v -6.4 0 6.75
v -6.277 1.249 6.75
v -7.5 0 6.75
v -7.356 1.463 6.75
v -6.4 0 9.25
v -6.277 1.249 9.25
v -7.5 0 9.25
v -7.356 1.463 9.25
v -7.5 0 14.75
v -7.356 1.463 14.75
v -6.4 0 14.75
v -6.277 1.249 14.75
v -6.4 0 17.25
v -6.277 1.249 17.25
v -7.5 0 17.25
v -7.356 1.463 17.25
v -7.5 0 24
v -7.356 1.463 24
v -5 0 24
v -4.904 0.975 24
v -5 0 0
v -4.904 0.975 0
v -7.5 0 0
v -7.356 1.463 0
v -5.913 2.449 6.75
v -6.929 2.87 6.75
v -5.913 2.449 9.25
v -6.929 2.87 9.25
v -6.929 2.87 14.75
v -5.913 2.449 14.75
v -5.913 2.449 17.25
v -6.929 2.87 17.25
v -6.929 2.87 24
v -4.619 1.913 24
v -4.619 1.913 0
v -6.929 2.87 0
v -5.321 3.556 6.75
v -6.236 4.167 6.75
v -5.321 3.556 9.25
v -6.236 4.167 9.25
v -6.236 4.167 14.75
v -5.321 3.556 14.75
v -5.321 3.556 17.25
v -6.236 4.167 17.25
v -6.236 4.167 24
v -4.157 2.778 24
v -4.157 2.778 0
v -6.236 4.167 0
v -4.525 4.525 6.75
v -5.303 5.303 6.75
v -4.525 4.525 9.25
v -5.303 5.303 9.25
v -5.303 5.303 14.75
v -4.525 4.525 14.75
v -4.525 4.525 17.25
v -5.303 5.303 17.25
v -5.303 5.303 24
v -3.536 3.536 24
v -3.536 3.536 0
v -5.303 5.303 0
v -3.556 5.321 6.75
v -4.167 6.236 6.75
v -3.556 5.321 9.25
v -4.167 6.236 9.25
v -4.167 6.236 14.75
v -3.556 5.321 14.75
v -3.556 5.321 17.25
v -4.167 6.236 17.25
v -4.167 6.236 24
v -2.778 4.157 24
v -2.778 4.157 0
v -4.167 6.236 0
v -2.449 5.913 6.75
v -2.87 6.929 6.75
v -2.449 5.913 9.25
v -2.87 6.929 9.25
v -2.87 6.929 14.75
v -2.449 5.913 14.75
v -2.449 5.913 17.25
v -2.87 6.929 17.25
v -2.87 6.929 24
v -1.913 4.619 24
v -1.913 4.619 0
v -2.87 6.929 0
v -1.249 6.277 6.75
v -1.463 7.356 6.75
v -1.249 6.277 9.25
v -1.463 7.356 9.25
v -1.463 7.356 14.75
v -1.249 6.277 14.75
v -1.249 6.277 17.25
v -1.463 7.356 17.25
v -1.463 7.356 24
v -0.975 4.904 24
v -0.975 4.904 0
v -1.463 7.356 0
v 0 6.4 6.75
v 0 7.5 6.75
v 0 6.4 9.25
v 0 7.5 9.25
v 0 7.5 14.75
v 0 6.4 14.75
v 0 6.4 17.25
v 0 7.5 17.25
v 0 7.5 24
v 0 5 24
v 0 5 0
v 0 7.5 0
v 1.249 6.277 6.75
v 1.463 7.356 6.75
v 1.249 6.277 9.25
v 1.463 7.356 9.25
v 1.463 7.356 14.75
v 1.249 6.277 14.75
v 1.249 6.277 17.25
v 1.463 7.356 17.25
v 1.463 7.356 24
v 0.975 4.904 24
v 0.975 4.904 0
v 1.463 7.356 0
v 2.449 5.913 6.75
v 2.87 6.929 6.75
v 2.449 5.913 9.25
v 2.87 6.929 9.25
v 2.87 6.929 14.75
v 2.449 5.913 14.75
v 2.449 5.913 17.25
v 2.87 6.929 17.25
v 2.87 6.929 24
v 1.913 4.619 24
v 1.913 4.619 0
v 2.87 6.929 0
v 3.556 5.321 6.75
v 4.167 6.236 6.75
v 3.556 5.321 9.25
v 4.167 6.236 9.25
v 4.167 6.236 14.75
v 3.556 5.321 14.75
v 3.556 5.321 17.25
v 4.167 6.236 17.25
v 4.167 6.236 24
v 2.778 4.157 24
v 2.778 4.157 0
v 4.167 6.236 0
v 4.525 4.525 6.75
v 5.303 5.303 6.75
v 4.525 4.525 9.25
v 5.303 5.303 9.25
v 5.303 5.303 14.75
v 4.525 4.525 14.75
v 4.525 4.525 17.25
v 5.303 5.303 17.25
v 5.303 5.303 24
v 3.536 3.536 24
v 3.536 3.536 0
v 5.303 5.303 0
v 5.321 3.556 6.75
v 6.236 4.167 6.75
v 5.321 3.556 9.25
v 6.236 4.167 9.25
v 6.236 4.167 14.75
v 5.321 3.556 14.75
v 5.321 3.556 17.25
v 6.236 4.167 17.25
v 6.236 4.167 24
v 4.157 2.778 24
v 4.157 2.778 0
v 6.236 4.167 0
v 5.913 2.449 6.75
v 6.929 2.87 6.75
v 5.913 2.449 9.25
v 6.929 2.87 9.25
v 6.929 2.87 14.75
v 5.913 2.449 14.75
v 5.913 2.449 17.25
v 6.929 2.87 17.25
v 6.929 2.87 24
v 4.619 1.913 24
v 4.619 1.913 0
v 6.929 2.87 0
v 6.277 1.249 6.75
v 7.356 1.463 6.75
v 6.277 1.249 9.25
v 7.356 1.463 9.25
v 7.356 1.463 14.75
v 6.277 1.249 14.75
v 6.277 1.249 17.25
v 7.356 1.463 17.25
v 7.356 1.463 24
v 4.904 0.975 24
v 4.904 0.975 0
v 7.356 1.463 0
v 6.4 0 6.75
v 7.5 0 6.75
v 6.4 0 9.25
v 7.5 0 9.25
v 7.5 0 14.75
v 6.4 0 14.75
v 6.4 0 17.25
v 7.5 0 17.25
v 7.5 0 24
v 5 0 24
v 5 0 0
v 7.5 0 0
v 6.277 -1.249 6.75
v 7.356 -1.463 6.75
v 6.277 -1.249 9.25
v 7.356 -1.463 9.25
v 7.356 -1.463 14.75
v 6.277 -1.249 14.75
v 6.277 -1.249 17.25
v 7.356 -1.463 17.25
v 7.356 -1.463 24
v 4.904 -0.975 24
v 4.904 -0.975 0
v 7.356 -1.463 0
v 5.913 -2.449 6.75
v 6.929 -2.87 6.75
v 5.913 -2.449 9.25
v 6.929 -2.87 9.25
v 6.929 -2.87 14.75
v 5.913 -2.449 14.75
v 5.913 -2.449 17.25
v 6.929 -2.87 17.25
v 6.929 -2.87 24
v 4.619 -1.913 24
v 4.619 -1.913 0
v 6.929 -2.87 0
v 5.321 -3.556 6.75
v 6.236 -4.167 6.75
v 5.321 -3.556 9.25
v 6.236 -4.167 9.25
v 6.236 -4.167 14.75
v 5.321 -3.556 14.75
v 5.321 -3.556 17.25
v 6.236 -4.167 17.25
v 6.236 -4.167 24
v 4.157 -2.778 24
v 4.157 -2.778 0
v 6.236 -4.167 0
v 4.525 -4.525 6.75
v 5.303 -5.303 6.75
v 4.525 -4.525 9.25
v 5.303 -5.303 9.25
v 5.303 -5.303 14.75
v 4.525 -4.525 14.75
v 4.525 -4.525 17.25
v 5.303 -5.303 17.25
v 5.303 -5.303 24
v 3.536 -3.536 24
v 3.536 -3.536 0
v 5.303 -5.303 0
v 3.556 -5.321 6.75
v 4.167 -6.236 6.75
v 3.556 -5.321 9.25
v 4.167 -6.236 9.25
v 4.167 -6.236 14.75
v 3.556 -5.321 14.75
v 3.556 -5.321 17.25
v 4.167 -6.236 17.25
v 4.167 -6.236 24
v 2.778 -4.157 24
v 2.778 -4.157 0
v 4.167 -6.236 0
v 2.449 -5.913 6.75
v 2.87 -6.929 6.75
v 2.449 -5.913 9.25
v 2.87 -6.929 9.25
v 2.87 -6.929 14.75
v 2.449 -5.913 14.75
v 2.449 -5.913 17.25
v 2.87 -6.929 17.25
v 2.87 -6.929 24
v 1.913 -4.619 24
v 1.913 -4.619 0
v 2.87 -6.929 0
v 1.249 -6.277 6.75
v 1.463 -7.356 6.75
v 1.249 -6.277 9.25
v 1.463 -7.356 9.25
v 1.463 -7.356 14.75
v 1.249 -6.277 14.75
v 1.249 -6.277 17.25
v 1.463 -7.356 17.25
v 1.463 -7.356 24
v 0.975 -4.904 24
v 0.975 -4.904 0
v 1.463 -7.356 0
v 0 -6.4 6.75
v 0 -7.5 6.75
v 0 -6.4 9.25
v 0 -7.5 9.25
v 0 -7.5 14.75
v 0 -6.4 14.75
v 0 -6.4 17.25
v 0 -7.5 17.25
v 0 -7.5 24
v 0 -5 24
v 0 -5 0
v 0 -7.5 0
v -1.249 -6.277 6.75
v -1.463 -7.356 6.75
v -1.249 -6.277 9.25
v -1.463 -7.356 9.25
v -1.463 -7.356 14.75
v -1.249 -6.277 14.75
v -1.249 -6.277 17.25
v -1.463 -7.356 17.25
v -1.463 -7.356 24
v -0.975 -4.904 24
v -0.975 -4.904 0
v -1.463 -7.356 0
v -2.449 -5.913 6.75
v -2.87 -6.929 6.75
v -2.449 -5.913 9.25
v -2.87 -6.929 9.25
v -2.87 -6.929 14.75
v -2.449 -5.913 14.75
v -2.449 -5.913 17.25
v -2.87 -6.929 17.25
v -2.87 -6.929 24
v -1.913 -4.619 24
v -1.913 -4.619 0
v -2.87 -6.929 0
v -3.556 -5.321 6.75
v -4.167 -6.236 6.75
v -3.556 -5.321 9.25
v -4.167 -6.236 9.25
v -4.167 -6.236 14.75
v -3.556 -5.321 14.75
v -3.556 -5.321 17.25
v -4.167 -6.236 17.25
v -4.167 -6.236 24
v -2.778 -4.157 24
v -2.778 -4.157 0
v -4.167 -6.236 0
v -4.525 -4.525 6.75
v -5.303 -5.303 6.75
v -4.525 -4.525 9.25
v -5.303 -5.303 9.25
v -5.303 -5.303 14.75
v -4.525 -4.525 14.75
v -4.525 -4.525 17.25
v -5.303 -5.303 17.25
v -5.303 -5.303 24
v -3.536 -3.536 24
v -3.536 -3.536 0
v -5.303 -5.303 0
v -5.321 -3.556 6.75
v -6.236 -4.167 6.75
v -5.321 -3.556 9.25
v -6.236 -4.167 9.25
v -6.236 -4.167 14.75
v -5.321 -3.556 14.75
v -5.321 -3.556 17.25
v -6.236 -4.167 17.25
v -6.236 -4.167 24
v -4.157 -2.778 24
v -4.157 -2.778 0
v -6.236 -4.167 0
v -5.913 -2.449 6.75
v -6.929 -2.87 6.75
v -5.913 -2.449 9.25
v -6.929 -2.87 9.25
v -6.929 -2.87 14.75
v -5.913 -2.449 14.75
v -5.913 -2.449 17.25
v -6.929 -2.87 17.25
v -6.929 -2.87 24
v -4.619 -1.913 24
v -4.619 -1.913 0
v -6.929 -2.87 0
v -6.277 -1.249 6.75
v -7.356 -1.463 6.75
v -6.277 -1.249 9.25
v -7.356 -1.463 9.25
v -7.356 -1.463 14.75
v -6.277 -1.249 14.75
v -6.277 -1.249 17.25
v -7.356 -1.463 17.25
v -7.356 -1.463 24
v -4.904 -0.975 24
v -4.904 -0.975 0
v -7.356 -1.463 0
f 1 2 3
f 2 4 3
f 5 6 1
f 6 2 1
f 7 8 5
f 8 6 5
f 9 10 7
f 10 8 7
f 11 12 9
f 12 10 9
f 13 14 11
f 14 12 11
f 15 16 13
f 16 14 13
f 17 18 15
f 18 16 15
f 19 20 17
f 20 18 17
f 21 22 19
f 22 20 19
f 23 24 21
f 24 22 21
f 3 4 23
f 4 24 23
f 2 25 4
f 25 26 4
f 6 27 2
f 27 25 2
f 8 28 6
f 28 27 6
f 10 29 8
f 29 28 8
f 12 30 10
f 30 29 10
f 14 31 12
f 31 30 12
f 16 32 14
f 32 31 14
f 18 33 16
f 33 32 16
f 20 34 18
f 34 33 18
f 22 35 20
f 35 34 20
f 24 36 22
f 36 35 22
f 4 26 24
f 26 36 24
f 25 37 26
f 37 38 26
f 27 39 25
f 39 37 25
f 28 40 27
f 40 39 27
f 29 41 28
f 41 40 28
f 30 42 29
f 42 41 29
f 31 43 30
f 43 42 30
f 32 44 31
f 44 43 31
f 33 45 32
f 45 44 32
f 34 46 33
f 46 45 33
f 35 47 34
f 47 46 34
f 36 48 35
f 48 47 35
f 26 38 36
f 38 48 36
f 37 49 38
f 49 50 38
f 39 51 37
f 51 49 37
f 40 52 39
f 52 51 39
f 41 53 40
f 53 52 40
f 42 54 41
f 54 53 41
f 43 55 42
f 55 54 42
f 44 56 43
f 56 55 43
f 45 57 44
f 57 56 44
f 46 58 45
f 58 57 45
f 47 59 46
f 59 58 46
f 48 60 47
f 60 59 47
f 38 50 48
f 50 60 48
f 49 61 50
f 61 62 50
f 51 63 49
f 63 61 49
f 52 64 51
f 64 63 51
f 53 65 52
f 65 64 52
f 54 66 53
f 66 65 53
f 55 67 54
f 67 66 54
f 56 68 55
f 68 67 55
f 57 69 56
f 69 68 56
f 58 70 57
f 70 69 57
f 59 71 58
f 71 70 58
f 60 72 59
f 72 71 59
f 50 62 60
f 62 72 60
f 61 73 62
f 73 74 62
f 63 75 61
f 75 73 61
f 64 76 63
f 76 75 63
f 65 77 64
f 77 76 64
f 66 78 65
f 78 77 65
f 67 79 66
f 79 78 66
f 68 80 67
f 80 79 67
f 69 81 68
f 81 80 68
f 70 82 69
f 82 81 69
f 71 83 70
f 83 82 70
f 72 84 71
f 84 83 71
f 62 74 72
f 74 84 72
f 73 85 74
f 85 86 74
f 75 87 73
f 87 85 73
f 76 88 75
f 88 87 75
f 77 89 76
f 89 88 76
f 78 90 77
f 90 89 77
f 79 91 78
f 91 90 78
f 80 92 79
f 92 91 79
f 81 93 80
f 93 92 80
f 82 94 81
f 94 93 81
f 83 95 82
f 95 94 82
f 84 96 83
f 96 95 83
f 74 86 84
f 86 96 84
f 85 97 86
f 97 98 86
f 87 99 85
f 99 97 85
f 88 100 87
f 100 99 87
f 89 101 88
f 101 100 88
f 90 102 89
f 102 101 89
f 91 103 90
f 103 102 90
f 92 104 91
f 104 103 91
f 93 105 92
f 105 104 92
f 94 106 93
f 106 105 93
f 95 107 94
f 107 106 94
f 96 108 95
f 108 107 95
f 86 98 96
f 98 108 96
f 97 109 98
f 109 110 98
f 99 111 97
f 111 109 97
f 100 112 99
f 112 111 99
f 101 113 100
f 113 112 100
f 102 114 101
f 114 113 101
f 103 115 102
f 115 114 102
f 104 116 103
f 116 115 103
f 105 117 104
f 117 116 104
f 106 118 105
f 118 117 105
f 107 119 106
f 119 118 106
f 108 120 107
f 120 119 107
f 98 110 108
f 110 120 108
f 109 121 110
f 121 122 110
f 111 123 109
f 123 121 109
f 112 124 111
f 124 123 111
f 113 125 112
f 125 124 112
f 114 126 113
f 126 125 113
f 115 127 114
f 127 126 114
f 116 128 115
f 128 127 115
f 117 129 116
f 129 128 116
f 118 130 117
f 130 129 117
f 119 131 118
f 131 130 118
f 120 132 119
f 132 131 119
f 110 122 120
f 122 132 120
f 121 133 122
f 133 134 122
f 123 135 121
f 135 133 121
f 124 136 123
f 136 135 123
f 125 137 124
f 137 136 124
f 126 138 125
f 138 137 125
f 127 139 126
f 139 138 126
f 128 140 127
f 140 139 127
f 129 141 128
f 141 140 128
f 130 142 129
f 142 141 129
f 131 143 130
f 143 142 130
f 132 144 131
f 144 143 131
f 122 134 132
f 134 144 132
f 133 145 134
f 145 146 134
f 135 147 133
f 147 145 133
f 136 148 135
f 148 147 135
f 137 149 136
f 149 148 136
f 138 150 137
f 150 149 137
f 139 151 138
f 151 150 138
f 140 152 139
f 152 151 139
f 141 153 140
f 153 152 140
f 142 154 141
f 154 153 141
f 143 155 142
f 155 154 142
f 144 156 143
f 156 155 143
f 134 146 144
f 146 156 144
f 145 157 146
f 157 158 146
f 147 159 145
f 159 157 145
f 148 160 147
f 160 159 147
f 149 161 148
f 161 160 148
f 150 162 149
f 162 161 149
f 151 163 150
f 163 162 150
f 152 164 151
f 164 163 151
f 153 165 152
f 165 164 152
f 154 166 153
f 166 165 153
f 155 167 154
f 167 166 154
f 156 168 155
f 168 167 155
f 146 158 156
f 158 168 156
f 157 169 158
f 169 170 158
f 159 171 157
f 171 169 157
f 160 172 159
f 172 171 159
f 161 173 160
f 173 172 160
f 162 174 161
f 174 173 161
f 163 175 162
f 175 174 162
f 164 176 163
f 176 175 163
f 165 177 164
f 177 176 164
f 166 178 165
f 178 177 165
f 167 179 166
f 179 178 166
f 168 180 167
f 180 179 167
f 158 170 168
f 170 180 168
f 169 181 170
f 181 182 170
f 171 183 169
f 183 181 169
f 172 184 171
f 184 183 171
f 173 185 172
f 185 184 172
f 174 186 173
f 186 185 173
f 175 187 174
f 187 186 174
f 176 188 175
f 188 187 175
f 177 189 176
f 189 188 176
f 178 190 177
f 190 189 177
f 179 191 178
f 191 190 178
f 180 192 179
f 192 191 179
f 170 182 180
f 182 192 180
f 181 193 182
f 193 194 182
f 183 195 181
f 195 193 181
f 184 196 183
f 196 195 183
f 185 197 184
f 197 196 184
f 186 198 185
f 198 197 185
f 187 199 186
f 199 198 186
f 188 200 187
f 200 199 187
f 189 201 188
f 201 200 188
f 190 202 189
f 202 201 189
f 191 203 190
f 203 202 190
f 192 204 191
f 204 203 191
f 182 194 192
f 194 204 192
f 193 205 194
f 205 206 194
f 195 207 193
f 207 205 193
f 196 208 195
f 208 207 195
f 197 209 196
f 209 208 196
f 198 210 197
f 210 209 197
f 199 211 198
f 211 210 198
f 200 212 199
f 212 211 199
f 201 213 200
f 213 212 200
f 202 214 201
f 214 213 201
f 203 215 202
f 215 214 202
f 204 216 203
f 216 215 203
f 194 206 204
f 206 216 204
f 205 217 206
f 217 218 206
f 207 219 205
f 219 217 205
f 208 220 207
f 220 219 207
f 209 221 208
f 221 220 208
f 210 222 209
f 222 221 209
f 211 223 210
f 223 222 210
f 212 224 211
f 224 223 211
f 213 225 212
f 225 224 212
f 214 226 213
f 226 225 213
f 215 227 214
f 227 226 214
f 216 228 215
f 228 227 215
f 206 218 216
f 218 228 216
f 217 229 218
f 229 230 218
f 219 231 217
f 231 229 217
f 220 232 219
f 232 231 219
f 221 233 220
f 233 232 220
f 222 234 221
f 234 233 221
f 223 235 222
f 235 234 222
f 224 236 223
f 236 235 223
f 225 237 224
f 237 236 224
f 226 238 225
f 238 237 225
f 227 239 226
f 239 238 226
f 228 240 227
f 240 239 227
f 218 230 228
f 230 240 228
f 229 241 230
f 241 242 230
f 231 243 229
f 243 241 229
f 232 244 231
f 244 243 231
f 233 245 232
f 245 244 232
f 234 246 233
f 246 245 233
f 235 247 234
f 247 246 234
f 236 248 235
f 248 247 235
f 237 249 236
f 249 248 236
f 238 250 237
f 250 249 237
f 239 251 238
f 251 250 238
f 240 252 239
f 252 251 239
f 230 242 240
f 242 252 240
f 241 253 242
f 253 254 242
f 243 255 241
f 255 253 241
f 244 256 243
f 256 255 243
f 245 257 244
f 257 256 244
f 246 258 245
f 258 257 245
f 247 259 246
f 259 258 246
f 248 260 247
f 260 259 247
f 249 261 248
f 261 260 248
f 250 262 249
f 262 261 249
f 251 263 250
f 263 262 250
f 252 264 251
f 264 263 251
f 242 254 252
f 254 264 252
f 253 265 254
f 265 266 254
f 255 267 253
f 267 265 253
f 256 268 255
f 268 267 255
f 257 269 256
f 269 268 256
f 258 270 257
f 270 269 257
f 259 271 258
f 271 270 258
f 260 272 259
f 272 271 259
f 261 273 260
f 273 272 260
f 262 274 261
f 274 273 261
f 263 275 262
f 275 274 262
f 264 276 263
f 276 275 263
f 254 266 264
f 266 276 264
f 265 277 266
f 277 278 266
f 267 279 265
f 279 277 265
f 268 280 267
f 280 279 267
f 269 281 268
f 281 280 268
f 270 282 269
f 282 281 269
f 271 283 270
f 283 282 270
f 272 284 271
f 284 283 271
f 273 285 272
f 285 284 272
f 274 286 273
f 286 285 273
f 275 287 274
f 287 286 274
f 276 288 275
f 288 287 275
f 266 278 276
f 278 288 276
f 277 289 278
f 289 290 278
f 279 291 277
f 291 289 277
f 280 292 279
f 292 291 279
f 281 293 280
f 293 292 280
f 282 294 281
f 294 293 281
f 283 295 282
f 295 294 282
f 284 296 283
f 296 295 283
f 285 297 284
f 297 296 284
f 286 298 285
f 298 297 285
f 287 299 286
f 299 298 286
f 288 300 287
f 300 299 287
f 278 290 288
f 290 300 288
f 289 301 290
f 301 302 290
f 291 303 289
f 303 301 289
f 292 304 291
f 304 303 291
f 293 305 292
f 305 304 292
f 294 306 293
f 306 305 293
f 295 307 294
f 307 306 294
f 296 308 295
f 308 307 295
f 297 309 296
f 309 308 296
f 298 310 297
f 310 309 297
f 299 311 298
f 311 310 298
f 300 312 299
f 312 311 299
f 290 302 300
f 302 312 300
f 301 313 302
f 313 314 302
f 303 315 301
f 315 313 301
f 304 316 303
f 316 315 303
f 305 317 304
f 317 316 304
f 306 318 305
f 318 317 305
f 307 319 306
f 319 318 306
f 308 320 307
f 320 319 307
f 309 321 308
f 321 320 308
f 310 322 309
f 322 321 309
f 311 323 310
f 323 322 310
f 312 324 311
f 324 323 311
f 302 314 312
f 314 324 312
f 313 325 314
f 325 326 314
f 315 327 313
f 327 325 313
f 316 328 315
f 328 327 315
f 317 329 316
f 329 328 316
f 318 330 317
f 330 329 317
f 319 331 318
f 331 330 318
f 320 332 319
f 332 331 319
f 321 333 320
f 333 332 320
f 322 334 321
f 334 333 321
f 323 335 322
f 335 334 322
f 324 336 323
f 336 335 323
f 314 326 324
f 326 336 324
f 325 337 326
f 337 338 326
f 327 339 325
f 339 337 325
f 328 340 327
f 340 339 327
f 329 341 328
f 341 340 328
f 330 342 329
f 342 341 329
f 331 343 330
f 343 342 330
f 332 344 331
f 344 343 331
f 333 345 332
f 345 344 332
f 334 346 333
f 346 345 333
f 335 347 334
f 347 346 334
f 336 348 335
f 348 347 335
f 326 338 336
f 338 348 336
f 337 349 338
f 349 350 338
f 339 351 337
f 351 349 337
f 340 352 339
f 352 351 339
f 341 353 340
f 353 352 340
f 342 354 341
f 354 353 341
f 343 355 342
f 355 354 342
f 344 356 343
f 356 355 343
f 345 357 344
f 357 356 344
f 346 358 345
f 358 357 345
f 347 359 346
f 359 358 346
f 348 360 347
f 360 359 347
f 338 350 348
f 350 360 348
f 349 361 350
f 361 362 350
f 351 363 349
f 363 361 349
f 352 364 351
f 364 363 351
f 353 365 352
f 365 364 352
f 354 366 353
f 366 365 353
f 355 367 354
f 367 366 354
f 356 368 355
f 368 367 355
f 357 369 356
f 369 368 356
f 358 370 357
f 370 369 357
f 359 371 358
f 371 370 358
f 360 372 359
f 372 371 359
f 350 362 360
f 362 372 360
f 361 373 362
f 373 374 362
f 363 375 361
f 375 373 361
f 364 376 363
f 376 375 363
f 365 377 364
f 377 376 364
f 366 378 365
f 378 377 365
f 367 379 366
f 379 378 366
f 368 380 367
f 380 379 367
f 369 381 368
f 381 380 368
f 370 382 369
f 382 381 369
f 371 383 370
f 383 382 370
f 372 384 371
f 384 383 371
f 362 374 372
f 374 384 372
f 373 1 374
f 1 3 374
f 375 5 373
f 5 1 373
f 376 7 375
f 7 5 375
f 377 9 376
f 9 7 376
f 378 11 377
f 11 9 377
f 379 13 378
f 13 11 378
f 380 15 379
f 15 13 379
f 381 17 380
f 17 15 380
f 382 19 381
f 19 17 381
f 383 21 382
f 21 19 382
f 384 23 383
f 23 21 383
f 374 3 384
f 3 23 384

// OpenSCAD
$fn = 32;

// ----------------------------------------------------------------------
// Grooved revolve: plain_grooves, bore R5
// ----------------------------------------------------------------------

// --- parameters (mm) ---
bore_r = 5;               // bore radius
outer_r = 7.5;            // outer radius of the body
total_h = 24;             // overall height, Z
wall = 2.5;               // radial wall thickness
groove_w = 2.5;           // groove width
groove_d = 1.1;           // groove depth
grooves = 2;              // number of outer grooves
fit_tol = 0.1;            // declared fit tolerance (prompt contract)
free_tol = 0.5;           // declared free tolerance (prompt contract)

bbox_x = 2 * outer_r;  // full diameter
bore_d = 2 * bore_r;  // bore diameter
body_d = 2 * outer_r;  // body diameter
revolve_angle = 360;  // full turn around the Z axis

profile = [[5, 0], [7.5, 0], [7.5, 6.75], [6.4, 6.75], [6.4, 9.25], [7.5, 9.25], [7.5, 14.75], [6.4, 14.75], [6.4, 17.25], [7.5, 17.25], [7.5, 24], [5, 24]];  // primary outline, 12 points, counter clockwise

// --- the one profile operation ---
rotate_extrude(angle = revolve_angle) polygon(points = profile);
